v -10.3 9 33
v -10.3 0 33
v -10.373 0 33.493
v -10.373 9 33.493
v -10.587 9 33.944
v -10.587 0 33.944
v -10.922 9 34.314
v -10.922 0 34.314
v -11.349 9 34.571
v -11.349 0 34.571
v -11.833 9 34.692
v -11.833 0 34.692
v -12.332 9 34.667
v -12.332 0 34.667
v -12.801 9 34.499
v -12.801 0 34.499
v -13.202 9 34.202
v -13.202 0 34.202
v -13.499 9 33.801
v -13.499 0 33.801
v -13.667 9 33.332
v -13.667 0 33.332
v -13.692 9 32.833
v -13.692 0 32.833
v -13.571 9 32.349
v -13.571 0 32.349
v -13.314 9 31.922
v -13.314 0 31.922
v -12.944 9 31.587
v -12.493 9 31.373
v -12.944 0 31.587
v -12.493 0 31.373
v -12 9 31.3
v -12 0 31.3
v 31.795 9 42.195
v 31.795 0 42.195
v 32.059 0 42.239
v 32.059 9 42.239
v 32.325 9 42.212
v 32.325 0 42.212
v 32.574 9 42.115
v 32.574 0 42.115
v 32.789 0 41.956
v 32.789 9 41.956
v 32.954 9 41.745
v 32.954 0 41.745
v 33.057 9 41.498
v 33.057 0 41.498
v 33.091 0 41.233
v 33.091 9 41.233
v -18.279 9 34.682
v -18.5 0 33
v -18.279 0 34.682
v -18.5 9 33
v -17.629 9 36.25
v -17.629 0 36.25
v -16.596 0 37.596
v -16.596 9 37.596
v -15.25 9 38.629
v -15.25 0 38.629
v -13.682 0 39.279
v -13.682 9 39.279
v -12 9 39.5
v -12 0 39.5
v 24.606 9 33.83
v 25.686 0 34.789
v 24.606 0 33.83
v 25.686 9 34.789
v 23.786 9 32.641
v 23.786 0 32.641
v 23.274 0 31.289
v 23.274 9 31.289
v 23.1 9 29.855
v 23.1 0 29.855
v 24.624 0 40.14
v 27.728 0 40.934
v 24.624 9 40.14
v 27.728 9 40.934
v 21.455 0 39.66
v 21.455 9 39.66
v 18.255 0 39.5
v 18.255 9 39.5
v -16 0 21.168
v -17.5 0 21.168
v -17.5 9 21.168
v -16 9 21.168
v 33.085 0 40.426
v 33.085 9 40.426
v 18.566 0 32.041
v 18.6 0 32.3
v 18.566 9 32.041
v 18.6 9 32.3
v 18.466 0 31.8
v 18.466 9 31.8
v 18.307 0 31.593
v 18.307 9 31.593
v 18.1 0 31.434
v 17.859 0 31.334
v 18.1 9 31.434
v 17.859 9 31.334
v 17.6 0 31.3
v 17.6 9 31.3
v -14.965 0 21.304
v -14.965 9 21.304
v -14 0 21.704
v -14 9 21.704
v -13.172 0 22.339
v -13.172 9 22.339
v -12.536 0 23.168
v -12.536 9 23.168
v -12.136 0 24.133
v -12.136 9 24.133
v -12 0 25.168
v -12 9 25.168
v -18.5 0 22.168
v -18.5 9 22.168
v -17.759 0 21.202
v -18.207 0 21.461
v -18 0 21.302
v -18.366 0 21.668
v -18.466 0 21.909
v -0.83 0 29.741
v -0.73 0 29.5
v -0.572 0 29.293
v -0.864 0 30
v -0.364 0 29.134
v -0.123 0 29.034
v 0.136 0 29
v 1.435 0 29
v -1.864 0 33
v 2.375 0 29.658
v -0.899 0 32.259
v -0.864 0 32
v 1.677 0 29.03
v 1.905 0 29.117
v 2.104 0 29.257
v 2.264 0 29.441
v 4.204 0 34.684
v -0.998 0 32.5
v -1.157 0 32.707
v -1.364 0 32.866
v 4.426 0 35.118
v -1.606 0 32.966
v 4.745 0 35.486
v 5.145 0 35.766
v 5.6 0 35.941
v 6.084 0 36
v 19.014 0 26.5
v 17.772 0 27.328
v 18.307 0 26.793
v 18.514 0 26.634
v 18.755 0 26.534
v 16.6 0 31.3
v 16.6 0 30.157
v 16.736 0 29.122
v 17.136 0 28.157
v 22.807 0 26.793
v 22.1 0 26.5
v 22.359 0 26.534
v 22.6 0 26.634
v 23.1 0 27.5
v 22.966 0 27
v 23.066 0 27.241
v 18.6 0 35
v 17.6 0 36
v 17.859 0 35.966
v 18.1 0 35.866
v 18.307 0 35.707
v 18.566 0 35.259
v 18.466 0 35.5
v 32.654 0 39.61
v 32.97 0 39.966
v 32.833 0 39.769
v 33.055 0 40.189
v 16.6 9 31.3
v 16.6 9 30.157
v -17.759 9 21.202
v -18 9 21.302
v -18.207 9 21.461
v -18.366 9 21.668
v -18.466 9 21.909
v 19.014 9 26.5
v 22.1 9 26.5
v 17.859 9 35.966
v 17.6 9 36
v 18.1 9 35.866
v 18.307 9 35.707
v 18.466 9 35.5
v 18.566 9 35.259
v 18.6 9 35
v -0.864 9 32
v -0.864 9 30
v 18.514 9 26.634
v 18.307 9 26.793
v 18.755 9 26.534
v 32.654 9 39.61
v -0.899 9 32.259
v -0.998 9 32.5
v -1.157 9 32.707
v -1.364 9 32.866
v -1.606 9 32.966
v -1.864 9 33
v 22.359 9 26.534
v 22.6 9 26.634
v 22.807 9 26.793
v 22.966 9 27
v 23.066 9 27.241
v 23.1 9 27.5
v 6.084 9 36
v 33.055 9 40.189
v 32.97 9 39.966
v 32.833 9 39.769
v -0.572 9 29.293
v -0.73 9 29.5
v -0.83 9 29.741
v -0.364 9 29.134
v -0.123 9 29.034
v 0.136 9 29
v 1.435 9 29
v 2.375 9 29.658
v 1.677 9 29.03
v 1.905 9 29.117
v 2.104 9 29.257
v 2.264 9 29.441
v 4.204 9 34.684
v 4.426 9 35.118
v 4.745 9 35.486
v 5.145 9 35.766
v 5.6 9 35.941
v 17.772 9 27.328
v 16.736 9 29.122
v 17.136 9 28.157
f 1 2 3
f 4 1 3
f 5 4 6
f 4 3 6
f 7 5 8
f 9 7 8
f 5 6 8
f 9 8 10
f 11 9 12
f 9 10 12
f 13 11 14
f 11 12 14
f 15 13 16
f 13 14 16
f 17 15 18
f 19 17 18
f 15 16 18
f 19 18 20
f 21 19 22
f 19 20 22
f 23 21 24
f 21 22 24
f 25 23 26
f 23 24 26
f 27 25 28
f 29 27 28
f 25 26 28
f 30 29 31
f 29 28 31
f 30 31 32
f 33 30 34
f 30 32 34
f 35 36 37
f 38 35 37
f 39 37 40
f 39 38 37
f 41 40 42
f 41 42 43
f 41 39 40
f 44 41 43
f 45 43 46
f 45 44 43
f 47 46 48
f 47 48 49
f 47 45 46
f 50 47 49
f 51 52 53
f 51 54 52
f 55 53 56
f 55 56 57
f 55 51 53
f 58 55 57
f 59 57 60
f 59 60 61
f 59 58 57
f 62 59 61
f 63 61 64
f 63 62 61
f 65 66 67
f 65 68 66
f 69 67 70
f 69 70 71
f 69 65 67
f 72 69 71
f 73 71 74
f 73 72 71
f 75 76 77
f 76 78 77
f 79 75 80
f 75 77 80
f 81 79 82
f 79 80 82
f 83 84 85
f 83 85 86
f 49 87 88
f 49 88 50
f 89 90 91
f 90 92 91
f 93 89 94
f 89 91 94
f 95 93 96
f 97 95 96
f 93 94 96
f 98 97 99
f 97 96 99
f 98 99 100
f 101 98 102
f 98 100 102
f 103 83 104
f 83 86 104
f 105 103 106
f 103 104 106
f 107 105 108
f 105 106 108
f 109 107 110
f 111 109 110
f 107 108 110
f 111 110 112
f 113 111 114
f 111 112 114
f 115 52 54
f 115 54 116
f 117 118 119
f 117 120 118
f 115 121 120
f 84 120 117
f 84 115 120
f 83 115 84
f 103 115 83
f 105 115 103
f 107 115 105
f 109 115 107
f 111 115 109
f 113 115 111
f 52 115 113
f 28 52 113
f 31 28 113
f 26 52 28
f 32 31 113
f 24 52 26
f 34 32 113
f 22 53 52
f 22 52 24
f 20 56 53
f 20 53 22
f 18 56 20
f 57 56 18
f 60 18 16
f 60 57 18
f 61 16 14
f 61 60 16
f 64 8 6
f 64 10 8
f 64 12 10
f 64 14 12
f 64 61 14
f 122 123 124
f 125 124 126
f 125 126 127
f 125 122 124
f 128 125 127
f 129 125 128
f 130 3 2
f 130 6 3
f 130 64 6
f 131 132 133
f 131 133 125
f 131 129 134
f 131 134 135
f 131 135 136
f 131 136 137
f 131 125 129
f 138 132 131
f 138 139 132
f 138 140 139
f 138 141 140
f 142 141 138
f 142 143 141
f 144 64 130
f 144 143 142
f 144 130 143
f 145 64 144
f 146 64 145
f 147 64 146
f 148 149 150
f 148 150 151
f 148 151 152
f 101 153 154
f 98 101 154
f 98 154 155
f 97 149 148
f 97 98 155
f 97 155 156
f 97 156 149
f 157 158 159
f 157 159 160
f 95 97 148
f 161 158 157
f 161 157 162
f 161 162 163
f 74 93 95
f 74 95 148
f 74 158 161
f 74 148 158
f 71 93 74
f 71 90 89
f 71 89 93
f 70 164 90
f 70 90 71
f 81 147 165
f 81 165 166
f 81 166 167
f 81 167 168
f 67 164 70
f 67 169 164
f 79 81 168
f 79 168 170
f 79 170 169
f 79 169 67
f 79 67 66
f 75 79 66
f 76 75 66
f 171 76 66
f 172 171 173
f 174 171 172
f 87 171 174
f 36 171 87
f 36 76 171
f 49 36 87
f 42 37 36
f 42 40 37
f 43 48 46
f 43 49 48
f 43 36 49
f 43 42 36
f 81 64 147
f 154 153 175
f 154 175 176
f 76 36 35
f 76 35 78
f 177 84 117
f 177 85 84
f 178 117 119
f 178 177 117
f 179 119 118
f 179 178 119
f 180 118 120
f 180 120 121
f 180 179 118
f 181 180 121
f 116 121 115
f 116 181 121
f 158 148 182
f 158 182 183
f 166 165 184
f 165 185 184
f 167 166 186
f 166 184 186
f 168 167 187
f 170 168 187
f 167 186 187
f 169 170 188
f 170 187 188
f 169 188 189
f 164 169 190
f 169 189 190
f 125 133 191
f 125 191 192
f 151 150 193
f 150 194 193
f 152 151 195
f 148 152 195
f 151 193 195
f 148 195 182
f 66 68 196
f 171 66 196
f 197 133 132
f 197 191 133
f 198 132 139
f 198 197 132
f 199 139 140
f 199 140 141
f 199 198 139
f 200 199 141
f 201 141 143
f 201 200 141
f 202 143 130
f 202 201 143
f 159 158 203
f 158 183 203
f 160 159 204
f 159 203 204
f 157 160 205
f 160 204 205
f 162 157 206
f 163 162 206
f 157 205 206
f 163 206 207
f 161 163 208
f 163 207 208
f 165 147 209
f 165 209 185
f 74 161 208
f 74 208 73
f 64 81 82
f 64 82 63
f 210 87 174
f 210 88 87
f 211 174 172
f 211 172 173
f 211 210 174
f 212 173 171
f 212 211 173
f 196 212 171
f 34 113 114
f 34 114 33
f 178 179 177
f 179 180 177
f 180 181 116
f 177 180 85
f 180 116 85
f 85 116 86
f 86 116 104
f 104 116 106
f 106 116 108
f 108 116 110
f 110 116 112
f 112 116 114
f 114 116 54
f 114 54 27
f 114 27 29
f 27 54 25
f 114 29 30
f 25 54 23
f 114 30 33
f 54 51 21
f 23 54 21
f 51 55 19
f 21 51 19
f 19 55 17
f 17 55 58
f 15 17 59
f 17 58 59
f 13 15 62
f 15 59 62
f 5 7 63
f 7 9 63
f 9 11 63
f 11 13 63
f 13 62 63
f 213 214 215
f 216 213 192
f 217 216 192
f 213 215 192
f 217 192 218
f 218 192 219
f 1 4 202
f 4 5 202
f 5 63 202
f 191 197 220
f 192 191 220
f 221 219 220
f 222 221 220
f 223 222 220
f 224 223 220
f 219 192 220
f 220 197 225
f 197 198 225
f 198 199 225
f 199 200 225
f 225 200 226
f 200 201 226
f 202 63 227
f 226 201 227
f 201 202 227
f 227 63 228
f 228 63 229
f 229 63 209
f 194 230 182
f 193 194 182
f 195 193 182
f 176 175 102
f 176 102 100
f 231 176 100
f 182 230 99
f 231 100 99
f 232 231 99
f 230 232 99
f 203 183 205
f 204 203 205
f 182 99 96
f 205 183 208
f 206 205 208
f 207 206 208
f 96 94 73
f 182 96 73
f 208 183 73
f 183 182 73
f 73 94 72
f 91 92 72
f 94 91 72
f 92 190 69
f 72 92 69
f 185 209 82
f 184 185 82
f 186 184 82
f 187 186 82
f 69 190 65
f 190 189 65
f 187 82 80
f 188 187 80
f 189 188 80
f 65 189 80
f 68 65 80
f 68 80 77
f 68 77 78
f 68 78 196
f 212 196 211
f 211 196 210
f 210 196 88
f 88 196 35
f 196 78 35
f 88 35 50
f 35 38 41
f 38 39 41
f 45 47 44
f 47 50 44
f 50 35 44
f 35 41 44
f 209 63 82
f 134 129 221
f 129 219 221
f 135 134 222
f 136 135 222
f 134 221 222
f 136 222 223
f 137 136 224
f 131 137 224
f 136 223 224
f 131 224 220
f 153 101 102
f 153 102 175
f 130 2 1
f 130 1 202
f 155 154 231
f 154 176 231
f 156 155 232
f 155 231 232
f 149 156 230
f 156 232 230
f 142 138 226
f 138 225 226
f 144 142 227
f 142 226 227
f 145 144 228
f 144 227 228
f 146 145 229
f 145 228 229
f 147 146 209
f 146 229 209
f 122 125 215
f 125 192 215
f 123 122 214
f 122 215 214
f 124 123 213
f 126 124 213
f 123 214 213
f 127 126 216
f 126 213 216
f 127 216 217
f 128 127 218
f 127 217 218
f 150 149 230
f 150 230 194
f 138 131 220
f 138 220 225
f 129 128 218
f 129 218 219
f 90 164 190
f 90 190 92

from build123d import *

# Parameters (mm, degrees)
PAD010_DEPTH    = 9
FILLET029_R     = 6.5
FILLET030_R     = 4
FILLET031_R     = 1
FILLET032_R     = 1
FILLET033_R     = 2
FILLET034_R     = 4
SKETCH043_R     = 1.7
POCKET021_DEPTH = 9
FILLET040_R     = 6
FILLET041_R     = 32
FILLET042_R     = 1


with BuildPart() as part:
    # Sketch040 → Pad010 (new body)
    with BuildSketch(Plane.XZ):
        Polygon((-18.1, 39.4), (-18.1, 21.0678404338), (-11.6, 21.0678404338), (-11.6, 32.9), (-0.4644712743, 32.9), (-0.4644712743, 28.9), (2.5355287257, 28.9), (5.0833203655, 35.9), (19, 35.9), (19, 31.2), (17, 31.2), (17, 28.4), (19, 26.4), (23.5, 26.4), (23.5, 32.9), (33.481928, 39.806227), (33.5, 42.499247), (23.5, 39.4), align=None)
    extrude(amount=-PAD010_DEPTH)

    # Fillet029
    fillet029_edges = [part.edges().sort_by_distance(p)[0] for p in [
        (-18.1, 4.5, 39.4),
    ]]
    fillet(fillet029_edges, radius=FILLET029_R)

    # Fillet030
    fillet030_edges = [part.edges().sort_by_distance(p)[0] for p in [
        (-11.6, 4.5, 21.06784),
    ]]
    fillet(fillet030_edges, radius=FILLET030_R)

    # Fillet031
    fillet031_edges = [part.edges().sort_by_distance(p)[0] for p in [
        (-0.464471, 4.5, 28.9),
    ]]
    fillet(fillet031_edges, radius=FILLET031_R)

    # Fillet032
    fillet032_edges = [part.edges().sort_by_distance(p)[0] for p in [
        (-0.464471, 4.5, 32.9),
        (19, 4.5, 35.9),
        (2.535529, 4.5, 28.9),
        (23.5, 4.5, 26.4),
        (19, 4.5, 26.4),
        (-18.1, 4.5, 21.06784),
        (19, 4.5, 31.2),
    ]]
    fillet(fillet032_edges, radius=FILLET032_R)

    # Fillet033
    fillet033_edges = [part.edges().sort_by_distance(p)[0] for p in [
        (5.08332, 4.5, 35.9),
    ]]
    fillet(fillet033_edges, radius=FILLET033_R)

    # Fillet034
    fillet034_edges = [part.edges().sort_by_distance(p)[0] for p in [
        (17, 4.5, 28.4),
    ]]
    fillet(fillet034_edges, radius=FILLET034_R)

    # Sketch043 (on Face1 of Fillet033) → Pocket021 (cut)
    with BuildSketch(Plane.XZ):
        with Locations((-11.6, 32.9)):
            Circle(SKETCH043_R)
    extrude(amount=-POCKET021_DEPTH, mode=Mode.SUBTRACT)

    # Fillet040
    fillet040_edges = [part.edges().sort_by_distance(p)[0] for p in [
        (23.5, 4.5, 32.9),
    ]]
    fillet(fillet040_edges, radius=FILLET040_R)

    # Fillet041
    fillet041_edges = [part.edges().sort_by_distance(p)[0] for p in [
        (23.5, 4.5, 39.4),
    ]]
    fillet(fillet041_edges, radius=FILLET041_R)

    # Fillet042
    fillet042_edges = [part.edges().sort_by_distance(p)[0] for p in [
        (33.481928, 4.5, 39.806227),
        (33.5, 4.5, 42.499247),
    ]]
    fillet(fillet042_edges, radius=FILLET042_R)


with BuildPart() as part_1:
    # Body008 placement: moved
    add(part.part.moved(Location((-0.4, 0, 0.1))))


solid = part_1.part
